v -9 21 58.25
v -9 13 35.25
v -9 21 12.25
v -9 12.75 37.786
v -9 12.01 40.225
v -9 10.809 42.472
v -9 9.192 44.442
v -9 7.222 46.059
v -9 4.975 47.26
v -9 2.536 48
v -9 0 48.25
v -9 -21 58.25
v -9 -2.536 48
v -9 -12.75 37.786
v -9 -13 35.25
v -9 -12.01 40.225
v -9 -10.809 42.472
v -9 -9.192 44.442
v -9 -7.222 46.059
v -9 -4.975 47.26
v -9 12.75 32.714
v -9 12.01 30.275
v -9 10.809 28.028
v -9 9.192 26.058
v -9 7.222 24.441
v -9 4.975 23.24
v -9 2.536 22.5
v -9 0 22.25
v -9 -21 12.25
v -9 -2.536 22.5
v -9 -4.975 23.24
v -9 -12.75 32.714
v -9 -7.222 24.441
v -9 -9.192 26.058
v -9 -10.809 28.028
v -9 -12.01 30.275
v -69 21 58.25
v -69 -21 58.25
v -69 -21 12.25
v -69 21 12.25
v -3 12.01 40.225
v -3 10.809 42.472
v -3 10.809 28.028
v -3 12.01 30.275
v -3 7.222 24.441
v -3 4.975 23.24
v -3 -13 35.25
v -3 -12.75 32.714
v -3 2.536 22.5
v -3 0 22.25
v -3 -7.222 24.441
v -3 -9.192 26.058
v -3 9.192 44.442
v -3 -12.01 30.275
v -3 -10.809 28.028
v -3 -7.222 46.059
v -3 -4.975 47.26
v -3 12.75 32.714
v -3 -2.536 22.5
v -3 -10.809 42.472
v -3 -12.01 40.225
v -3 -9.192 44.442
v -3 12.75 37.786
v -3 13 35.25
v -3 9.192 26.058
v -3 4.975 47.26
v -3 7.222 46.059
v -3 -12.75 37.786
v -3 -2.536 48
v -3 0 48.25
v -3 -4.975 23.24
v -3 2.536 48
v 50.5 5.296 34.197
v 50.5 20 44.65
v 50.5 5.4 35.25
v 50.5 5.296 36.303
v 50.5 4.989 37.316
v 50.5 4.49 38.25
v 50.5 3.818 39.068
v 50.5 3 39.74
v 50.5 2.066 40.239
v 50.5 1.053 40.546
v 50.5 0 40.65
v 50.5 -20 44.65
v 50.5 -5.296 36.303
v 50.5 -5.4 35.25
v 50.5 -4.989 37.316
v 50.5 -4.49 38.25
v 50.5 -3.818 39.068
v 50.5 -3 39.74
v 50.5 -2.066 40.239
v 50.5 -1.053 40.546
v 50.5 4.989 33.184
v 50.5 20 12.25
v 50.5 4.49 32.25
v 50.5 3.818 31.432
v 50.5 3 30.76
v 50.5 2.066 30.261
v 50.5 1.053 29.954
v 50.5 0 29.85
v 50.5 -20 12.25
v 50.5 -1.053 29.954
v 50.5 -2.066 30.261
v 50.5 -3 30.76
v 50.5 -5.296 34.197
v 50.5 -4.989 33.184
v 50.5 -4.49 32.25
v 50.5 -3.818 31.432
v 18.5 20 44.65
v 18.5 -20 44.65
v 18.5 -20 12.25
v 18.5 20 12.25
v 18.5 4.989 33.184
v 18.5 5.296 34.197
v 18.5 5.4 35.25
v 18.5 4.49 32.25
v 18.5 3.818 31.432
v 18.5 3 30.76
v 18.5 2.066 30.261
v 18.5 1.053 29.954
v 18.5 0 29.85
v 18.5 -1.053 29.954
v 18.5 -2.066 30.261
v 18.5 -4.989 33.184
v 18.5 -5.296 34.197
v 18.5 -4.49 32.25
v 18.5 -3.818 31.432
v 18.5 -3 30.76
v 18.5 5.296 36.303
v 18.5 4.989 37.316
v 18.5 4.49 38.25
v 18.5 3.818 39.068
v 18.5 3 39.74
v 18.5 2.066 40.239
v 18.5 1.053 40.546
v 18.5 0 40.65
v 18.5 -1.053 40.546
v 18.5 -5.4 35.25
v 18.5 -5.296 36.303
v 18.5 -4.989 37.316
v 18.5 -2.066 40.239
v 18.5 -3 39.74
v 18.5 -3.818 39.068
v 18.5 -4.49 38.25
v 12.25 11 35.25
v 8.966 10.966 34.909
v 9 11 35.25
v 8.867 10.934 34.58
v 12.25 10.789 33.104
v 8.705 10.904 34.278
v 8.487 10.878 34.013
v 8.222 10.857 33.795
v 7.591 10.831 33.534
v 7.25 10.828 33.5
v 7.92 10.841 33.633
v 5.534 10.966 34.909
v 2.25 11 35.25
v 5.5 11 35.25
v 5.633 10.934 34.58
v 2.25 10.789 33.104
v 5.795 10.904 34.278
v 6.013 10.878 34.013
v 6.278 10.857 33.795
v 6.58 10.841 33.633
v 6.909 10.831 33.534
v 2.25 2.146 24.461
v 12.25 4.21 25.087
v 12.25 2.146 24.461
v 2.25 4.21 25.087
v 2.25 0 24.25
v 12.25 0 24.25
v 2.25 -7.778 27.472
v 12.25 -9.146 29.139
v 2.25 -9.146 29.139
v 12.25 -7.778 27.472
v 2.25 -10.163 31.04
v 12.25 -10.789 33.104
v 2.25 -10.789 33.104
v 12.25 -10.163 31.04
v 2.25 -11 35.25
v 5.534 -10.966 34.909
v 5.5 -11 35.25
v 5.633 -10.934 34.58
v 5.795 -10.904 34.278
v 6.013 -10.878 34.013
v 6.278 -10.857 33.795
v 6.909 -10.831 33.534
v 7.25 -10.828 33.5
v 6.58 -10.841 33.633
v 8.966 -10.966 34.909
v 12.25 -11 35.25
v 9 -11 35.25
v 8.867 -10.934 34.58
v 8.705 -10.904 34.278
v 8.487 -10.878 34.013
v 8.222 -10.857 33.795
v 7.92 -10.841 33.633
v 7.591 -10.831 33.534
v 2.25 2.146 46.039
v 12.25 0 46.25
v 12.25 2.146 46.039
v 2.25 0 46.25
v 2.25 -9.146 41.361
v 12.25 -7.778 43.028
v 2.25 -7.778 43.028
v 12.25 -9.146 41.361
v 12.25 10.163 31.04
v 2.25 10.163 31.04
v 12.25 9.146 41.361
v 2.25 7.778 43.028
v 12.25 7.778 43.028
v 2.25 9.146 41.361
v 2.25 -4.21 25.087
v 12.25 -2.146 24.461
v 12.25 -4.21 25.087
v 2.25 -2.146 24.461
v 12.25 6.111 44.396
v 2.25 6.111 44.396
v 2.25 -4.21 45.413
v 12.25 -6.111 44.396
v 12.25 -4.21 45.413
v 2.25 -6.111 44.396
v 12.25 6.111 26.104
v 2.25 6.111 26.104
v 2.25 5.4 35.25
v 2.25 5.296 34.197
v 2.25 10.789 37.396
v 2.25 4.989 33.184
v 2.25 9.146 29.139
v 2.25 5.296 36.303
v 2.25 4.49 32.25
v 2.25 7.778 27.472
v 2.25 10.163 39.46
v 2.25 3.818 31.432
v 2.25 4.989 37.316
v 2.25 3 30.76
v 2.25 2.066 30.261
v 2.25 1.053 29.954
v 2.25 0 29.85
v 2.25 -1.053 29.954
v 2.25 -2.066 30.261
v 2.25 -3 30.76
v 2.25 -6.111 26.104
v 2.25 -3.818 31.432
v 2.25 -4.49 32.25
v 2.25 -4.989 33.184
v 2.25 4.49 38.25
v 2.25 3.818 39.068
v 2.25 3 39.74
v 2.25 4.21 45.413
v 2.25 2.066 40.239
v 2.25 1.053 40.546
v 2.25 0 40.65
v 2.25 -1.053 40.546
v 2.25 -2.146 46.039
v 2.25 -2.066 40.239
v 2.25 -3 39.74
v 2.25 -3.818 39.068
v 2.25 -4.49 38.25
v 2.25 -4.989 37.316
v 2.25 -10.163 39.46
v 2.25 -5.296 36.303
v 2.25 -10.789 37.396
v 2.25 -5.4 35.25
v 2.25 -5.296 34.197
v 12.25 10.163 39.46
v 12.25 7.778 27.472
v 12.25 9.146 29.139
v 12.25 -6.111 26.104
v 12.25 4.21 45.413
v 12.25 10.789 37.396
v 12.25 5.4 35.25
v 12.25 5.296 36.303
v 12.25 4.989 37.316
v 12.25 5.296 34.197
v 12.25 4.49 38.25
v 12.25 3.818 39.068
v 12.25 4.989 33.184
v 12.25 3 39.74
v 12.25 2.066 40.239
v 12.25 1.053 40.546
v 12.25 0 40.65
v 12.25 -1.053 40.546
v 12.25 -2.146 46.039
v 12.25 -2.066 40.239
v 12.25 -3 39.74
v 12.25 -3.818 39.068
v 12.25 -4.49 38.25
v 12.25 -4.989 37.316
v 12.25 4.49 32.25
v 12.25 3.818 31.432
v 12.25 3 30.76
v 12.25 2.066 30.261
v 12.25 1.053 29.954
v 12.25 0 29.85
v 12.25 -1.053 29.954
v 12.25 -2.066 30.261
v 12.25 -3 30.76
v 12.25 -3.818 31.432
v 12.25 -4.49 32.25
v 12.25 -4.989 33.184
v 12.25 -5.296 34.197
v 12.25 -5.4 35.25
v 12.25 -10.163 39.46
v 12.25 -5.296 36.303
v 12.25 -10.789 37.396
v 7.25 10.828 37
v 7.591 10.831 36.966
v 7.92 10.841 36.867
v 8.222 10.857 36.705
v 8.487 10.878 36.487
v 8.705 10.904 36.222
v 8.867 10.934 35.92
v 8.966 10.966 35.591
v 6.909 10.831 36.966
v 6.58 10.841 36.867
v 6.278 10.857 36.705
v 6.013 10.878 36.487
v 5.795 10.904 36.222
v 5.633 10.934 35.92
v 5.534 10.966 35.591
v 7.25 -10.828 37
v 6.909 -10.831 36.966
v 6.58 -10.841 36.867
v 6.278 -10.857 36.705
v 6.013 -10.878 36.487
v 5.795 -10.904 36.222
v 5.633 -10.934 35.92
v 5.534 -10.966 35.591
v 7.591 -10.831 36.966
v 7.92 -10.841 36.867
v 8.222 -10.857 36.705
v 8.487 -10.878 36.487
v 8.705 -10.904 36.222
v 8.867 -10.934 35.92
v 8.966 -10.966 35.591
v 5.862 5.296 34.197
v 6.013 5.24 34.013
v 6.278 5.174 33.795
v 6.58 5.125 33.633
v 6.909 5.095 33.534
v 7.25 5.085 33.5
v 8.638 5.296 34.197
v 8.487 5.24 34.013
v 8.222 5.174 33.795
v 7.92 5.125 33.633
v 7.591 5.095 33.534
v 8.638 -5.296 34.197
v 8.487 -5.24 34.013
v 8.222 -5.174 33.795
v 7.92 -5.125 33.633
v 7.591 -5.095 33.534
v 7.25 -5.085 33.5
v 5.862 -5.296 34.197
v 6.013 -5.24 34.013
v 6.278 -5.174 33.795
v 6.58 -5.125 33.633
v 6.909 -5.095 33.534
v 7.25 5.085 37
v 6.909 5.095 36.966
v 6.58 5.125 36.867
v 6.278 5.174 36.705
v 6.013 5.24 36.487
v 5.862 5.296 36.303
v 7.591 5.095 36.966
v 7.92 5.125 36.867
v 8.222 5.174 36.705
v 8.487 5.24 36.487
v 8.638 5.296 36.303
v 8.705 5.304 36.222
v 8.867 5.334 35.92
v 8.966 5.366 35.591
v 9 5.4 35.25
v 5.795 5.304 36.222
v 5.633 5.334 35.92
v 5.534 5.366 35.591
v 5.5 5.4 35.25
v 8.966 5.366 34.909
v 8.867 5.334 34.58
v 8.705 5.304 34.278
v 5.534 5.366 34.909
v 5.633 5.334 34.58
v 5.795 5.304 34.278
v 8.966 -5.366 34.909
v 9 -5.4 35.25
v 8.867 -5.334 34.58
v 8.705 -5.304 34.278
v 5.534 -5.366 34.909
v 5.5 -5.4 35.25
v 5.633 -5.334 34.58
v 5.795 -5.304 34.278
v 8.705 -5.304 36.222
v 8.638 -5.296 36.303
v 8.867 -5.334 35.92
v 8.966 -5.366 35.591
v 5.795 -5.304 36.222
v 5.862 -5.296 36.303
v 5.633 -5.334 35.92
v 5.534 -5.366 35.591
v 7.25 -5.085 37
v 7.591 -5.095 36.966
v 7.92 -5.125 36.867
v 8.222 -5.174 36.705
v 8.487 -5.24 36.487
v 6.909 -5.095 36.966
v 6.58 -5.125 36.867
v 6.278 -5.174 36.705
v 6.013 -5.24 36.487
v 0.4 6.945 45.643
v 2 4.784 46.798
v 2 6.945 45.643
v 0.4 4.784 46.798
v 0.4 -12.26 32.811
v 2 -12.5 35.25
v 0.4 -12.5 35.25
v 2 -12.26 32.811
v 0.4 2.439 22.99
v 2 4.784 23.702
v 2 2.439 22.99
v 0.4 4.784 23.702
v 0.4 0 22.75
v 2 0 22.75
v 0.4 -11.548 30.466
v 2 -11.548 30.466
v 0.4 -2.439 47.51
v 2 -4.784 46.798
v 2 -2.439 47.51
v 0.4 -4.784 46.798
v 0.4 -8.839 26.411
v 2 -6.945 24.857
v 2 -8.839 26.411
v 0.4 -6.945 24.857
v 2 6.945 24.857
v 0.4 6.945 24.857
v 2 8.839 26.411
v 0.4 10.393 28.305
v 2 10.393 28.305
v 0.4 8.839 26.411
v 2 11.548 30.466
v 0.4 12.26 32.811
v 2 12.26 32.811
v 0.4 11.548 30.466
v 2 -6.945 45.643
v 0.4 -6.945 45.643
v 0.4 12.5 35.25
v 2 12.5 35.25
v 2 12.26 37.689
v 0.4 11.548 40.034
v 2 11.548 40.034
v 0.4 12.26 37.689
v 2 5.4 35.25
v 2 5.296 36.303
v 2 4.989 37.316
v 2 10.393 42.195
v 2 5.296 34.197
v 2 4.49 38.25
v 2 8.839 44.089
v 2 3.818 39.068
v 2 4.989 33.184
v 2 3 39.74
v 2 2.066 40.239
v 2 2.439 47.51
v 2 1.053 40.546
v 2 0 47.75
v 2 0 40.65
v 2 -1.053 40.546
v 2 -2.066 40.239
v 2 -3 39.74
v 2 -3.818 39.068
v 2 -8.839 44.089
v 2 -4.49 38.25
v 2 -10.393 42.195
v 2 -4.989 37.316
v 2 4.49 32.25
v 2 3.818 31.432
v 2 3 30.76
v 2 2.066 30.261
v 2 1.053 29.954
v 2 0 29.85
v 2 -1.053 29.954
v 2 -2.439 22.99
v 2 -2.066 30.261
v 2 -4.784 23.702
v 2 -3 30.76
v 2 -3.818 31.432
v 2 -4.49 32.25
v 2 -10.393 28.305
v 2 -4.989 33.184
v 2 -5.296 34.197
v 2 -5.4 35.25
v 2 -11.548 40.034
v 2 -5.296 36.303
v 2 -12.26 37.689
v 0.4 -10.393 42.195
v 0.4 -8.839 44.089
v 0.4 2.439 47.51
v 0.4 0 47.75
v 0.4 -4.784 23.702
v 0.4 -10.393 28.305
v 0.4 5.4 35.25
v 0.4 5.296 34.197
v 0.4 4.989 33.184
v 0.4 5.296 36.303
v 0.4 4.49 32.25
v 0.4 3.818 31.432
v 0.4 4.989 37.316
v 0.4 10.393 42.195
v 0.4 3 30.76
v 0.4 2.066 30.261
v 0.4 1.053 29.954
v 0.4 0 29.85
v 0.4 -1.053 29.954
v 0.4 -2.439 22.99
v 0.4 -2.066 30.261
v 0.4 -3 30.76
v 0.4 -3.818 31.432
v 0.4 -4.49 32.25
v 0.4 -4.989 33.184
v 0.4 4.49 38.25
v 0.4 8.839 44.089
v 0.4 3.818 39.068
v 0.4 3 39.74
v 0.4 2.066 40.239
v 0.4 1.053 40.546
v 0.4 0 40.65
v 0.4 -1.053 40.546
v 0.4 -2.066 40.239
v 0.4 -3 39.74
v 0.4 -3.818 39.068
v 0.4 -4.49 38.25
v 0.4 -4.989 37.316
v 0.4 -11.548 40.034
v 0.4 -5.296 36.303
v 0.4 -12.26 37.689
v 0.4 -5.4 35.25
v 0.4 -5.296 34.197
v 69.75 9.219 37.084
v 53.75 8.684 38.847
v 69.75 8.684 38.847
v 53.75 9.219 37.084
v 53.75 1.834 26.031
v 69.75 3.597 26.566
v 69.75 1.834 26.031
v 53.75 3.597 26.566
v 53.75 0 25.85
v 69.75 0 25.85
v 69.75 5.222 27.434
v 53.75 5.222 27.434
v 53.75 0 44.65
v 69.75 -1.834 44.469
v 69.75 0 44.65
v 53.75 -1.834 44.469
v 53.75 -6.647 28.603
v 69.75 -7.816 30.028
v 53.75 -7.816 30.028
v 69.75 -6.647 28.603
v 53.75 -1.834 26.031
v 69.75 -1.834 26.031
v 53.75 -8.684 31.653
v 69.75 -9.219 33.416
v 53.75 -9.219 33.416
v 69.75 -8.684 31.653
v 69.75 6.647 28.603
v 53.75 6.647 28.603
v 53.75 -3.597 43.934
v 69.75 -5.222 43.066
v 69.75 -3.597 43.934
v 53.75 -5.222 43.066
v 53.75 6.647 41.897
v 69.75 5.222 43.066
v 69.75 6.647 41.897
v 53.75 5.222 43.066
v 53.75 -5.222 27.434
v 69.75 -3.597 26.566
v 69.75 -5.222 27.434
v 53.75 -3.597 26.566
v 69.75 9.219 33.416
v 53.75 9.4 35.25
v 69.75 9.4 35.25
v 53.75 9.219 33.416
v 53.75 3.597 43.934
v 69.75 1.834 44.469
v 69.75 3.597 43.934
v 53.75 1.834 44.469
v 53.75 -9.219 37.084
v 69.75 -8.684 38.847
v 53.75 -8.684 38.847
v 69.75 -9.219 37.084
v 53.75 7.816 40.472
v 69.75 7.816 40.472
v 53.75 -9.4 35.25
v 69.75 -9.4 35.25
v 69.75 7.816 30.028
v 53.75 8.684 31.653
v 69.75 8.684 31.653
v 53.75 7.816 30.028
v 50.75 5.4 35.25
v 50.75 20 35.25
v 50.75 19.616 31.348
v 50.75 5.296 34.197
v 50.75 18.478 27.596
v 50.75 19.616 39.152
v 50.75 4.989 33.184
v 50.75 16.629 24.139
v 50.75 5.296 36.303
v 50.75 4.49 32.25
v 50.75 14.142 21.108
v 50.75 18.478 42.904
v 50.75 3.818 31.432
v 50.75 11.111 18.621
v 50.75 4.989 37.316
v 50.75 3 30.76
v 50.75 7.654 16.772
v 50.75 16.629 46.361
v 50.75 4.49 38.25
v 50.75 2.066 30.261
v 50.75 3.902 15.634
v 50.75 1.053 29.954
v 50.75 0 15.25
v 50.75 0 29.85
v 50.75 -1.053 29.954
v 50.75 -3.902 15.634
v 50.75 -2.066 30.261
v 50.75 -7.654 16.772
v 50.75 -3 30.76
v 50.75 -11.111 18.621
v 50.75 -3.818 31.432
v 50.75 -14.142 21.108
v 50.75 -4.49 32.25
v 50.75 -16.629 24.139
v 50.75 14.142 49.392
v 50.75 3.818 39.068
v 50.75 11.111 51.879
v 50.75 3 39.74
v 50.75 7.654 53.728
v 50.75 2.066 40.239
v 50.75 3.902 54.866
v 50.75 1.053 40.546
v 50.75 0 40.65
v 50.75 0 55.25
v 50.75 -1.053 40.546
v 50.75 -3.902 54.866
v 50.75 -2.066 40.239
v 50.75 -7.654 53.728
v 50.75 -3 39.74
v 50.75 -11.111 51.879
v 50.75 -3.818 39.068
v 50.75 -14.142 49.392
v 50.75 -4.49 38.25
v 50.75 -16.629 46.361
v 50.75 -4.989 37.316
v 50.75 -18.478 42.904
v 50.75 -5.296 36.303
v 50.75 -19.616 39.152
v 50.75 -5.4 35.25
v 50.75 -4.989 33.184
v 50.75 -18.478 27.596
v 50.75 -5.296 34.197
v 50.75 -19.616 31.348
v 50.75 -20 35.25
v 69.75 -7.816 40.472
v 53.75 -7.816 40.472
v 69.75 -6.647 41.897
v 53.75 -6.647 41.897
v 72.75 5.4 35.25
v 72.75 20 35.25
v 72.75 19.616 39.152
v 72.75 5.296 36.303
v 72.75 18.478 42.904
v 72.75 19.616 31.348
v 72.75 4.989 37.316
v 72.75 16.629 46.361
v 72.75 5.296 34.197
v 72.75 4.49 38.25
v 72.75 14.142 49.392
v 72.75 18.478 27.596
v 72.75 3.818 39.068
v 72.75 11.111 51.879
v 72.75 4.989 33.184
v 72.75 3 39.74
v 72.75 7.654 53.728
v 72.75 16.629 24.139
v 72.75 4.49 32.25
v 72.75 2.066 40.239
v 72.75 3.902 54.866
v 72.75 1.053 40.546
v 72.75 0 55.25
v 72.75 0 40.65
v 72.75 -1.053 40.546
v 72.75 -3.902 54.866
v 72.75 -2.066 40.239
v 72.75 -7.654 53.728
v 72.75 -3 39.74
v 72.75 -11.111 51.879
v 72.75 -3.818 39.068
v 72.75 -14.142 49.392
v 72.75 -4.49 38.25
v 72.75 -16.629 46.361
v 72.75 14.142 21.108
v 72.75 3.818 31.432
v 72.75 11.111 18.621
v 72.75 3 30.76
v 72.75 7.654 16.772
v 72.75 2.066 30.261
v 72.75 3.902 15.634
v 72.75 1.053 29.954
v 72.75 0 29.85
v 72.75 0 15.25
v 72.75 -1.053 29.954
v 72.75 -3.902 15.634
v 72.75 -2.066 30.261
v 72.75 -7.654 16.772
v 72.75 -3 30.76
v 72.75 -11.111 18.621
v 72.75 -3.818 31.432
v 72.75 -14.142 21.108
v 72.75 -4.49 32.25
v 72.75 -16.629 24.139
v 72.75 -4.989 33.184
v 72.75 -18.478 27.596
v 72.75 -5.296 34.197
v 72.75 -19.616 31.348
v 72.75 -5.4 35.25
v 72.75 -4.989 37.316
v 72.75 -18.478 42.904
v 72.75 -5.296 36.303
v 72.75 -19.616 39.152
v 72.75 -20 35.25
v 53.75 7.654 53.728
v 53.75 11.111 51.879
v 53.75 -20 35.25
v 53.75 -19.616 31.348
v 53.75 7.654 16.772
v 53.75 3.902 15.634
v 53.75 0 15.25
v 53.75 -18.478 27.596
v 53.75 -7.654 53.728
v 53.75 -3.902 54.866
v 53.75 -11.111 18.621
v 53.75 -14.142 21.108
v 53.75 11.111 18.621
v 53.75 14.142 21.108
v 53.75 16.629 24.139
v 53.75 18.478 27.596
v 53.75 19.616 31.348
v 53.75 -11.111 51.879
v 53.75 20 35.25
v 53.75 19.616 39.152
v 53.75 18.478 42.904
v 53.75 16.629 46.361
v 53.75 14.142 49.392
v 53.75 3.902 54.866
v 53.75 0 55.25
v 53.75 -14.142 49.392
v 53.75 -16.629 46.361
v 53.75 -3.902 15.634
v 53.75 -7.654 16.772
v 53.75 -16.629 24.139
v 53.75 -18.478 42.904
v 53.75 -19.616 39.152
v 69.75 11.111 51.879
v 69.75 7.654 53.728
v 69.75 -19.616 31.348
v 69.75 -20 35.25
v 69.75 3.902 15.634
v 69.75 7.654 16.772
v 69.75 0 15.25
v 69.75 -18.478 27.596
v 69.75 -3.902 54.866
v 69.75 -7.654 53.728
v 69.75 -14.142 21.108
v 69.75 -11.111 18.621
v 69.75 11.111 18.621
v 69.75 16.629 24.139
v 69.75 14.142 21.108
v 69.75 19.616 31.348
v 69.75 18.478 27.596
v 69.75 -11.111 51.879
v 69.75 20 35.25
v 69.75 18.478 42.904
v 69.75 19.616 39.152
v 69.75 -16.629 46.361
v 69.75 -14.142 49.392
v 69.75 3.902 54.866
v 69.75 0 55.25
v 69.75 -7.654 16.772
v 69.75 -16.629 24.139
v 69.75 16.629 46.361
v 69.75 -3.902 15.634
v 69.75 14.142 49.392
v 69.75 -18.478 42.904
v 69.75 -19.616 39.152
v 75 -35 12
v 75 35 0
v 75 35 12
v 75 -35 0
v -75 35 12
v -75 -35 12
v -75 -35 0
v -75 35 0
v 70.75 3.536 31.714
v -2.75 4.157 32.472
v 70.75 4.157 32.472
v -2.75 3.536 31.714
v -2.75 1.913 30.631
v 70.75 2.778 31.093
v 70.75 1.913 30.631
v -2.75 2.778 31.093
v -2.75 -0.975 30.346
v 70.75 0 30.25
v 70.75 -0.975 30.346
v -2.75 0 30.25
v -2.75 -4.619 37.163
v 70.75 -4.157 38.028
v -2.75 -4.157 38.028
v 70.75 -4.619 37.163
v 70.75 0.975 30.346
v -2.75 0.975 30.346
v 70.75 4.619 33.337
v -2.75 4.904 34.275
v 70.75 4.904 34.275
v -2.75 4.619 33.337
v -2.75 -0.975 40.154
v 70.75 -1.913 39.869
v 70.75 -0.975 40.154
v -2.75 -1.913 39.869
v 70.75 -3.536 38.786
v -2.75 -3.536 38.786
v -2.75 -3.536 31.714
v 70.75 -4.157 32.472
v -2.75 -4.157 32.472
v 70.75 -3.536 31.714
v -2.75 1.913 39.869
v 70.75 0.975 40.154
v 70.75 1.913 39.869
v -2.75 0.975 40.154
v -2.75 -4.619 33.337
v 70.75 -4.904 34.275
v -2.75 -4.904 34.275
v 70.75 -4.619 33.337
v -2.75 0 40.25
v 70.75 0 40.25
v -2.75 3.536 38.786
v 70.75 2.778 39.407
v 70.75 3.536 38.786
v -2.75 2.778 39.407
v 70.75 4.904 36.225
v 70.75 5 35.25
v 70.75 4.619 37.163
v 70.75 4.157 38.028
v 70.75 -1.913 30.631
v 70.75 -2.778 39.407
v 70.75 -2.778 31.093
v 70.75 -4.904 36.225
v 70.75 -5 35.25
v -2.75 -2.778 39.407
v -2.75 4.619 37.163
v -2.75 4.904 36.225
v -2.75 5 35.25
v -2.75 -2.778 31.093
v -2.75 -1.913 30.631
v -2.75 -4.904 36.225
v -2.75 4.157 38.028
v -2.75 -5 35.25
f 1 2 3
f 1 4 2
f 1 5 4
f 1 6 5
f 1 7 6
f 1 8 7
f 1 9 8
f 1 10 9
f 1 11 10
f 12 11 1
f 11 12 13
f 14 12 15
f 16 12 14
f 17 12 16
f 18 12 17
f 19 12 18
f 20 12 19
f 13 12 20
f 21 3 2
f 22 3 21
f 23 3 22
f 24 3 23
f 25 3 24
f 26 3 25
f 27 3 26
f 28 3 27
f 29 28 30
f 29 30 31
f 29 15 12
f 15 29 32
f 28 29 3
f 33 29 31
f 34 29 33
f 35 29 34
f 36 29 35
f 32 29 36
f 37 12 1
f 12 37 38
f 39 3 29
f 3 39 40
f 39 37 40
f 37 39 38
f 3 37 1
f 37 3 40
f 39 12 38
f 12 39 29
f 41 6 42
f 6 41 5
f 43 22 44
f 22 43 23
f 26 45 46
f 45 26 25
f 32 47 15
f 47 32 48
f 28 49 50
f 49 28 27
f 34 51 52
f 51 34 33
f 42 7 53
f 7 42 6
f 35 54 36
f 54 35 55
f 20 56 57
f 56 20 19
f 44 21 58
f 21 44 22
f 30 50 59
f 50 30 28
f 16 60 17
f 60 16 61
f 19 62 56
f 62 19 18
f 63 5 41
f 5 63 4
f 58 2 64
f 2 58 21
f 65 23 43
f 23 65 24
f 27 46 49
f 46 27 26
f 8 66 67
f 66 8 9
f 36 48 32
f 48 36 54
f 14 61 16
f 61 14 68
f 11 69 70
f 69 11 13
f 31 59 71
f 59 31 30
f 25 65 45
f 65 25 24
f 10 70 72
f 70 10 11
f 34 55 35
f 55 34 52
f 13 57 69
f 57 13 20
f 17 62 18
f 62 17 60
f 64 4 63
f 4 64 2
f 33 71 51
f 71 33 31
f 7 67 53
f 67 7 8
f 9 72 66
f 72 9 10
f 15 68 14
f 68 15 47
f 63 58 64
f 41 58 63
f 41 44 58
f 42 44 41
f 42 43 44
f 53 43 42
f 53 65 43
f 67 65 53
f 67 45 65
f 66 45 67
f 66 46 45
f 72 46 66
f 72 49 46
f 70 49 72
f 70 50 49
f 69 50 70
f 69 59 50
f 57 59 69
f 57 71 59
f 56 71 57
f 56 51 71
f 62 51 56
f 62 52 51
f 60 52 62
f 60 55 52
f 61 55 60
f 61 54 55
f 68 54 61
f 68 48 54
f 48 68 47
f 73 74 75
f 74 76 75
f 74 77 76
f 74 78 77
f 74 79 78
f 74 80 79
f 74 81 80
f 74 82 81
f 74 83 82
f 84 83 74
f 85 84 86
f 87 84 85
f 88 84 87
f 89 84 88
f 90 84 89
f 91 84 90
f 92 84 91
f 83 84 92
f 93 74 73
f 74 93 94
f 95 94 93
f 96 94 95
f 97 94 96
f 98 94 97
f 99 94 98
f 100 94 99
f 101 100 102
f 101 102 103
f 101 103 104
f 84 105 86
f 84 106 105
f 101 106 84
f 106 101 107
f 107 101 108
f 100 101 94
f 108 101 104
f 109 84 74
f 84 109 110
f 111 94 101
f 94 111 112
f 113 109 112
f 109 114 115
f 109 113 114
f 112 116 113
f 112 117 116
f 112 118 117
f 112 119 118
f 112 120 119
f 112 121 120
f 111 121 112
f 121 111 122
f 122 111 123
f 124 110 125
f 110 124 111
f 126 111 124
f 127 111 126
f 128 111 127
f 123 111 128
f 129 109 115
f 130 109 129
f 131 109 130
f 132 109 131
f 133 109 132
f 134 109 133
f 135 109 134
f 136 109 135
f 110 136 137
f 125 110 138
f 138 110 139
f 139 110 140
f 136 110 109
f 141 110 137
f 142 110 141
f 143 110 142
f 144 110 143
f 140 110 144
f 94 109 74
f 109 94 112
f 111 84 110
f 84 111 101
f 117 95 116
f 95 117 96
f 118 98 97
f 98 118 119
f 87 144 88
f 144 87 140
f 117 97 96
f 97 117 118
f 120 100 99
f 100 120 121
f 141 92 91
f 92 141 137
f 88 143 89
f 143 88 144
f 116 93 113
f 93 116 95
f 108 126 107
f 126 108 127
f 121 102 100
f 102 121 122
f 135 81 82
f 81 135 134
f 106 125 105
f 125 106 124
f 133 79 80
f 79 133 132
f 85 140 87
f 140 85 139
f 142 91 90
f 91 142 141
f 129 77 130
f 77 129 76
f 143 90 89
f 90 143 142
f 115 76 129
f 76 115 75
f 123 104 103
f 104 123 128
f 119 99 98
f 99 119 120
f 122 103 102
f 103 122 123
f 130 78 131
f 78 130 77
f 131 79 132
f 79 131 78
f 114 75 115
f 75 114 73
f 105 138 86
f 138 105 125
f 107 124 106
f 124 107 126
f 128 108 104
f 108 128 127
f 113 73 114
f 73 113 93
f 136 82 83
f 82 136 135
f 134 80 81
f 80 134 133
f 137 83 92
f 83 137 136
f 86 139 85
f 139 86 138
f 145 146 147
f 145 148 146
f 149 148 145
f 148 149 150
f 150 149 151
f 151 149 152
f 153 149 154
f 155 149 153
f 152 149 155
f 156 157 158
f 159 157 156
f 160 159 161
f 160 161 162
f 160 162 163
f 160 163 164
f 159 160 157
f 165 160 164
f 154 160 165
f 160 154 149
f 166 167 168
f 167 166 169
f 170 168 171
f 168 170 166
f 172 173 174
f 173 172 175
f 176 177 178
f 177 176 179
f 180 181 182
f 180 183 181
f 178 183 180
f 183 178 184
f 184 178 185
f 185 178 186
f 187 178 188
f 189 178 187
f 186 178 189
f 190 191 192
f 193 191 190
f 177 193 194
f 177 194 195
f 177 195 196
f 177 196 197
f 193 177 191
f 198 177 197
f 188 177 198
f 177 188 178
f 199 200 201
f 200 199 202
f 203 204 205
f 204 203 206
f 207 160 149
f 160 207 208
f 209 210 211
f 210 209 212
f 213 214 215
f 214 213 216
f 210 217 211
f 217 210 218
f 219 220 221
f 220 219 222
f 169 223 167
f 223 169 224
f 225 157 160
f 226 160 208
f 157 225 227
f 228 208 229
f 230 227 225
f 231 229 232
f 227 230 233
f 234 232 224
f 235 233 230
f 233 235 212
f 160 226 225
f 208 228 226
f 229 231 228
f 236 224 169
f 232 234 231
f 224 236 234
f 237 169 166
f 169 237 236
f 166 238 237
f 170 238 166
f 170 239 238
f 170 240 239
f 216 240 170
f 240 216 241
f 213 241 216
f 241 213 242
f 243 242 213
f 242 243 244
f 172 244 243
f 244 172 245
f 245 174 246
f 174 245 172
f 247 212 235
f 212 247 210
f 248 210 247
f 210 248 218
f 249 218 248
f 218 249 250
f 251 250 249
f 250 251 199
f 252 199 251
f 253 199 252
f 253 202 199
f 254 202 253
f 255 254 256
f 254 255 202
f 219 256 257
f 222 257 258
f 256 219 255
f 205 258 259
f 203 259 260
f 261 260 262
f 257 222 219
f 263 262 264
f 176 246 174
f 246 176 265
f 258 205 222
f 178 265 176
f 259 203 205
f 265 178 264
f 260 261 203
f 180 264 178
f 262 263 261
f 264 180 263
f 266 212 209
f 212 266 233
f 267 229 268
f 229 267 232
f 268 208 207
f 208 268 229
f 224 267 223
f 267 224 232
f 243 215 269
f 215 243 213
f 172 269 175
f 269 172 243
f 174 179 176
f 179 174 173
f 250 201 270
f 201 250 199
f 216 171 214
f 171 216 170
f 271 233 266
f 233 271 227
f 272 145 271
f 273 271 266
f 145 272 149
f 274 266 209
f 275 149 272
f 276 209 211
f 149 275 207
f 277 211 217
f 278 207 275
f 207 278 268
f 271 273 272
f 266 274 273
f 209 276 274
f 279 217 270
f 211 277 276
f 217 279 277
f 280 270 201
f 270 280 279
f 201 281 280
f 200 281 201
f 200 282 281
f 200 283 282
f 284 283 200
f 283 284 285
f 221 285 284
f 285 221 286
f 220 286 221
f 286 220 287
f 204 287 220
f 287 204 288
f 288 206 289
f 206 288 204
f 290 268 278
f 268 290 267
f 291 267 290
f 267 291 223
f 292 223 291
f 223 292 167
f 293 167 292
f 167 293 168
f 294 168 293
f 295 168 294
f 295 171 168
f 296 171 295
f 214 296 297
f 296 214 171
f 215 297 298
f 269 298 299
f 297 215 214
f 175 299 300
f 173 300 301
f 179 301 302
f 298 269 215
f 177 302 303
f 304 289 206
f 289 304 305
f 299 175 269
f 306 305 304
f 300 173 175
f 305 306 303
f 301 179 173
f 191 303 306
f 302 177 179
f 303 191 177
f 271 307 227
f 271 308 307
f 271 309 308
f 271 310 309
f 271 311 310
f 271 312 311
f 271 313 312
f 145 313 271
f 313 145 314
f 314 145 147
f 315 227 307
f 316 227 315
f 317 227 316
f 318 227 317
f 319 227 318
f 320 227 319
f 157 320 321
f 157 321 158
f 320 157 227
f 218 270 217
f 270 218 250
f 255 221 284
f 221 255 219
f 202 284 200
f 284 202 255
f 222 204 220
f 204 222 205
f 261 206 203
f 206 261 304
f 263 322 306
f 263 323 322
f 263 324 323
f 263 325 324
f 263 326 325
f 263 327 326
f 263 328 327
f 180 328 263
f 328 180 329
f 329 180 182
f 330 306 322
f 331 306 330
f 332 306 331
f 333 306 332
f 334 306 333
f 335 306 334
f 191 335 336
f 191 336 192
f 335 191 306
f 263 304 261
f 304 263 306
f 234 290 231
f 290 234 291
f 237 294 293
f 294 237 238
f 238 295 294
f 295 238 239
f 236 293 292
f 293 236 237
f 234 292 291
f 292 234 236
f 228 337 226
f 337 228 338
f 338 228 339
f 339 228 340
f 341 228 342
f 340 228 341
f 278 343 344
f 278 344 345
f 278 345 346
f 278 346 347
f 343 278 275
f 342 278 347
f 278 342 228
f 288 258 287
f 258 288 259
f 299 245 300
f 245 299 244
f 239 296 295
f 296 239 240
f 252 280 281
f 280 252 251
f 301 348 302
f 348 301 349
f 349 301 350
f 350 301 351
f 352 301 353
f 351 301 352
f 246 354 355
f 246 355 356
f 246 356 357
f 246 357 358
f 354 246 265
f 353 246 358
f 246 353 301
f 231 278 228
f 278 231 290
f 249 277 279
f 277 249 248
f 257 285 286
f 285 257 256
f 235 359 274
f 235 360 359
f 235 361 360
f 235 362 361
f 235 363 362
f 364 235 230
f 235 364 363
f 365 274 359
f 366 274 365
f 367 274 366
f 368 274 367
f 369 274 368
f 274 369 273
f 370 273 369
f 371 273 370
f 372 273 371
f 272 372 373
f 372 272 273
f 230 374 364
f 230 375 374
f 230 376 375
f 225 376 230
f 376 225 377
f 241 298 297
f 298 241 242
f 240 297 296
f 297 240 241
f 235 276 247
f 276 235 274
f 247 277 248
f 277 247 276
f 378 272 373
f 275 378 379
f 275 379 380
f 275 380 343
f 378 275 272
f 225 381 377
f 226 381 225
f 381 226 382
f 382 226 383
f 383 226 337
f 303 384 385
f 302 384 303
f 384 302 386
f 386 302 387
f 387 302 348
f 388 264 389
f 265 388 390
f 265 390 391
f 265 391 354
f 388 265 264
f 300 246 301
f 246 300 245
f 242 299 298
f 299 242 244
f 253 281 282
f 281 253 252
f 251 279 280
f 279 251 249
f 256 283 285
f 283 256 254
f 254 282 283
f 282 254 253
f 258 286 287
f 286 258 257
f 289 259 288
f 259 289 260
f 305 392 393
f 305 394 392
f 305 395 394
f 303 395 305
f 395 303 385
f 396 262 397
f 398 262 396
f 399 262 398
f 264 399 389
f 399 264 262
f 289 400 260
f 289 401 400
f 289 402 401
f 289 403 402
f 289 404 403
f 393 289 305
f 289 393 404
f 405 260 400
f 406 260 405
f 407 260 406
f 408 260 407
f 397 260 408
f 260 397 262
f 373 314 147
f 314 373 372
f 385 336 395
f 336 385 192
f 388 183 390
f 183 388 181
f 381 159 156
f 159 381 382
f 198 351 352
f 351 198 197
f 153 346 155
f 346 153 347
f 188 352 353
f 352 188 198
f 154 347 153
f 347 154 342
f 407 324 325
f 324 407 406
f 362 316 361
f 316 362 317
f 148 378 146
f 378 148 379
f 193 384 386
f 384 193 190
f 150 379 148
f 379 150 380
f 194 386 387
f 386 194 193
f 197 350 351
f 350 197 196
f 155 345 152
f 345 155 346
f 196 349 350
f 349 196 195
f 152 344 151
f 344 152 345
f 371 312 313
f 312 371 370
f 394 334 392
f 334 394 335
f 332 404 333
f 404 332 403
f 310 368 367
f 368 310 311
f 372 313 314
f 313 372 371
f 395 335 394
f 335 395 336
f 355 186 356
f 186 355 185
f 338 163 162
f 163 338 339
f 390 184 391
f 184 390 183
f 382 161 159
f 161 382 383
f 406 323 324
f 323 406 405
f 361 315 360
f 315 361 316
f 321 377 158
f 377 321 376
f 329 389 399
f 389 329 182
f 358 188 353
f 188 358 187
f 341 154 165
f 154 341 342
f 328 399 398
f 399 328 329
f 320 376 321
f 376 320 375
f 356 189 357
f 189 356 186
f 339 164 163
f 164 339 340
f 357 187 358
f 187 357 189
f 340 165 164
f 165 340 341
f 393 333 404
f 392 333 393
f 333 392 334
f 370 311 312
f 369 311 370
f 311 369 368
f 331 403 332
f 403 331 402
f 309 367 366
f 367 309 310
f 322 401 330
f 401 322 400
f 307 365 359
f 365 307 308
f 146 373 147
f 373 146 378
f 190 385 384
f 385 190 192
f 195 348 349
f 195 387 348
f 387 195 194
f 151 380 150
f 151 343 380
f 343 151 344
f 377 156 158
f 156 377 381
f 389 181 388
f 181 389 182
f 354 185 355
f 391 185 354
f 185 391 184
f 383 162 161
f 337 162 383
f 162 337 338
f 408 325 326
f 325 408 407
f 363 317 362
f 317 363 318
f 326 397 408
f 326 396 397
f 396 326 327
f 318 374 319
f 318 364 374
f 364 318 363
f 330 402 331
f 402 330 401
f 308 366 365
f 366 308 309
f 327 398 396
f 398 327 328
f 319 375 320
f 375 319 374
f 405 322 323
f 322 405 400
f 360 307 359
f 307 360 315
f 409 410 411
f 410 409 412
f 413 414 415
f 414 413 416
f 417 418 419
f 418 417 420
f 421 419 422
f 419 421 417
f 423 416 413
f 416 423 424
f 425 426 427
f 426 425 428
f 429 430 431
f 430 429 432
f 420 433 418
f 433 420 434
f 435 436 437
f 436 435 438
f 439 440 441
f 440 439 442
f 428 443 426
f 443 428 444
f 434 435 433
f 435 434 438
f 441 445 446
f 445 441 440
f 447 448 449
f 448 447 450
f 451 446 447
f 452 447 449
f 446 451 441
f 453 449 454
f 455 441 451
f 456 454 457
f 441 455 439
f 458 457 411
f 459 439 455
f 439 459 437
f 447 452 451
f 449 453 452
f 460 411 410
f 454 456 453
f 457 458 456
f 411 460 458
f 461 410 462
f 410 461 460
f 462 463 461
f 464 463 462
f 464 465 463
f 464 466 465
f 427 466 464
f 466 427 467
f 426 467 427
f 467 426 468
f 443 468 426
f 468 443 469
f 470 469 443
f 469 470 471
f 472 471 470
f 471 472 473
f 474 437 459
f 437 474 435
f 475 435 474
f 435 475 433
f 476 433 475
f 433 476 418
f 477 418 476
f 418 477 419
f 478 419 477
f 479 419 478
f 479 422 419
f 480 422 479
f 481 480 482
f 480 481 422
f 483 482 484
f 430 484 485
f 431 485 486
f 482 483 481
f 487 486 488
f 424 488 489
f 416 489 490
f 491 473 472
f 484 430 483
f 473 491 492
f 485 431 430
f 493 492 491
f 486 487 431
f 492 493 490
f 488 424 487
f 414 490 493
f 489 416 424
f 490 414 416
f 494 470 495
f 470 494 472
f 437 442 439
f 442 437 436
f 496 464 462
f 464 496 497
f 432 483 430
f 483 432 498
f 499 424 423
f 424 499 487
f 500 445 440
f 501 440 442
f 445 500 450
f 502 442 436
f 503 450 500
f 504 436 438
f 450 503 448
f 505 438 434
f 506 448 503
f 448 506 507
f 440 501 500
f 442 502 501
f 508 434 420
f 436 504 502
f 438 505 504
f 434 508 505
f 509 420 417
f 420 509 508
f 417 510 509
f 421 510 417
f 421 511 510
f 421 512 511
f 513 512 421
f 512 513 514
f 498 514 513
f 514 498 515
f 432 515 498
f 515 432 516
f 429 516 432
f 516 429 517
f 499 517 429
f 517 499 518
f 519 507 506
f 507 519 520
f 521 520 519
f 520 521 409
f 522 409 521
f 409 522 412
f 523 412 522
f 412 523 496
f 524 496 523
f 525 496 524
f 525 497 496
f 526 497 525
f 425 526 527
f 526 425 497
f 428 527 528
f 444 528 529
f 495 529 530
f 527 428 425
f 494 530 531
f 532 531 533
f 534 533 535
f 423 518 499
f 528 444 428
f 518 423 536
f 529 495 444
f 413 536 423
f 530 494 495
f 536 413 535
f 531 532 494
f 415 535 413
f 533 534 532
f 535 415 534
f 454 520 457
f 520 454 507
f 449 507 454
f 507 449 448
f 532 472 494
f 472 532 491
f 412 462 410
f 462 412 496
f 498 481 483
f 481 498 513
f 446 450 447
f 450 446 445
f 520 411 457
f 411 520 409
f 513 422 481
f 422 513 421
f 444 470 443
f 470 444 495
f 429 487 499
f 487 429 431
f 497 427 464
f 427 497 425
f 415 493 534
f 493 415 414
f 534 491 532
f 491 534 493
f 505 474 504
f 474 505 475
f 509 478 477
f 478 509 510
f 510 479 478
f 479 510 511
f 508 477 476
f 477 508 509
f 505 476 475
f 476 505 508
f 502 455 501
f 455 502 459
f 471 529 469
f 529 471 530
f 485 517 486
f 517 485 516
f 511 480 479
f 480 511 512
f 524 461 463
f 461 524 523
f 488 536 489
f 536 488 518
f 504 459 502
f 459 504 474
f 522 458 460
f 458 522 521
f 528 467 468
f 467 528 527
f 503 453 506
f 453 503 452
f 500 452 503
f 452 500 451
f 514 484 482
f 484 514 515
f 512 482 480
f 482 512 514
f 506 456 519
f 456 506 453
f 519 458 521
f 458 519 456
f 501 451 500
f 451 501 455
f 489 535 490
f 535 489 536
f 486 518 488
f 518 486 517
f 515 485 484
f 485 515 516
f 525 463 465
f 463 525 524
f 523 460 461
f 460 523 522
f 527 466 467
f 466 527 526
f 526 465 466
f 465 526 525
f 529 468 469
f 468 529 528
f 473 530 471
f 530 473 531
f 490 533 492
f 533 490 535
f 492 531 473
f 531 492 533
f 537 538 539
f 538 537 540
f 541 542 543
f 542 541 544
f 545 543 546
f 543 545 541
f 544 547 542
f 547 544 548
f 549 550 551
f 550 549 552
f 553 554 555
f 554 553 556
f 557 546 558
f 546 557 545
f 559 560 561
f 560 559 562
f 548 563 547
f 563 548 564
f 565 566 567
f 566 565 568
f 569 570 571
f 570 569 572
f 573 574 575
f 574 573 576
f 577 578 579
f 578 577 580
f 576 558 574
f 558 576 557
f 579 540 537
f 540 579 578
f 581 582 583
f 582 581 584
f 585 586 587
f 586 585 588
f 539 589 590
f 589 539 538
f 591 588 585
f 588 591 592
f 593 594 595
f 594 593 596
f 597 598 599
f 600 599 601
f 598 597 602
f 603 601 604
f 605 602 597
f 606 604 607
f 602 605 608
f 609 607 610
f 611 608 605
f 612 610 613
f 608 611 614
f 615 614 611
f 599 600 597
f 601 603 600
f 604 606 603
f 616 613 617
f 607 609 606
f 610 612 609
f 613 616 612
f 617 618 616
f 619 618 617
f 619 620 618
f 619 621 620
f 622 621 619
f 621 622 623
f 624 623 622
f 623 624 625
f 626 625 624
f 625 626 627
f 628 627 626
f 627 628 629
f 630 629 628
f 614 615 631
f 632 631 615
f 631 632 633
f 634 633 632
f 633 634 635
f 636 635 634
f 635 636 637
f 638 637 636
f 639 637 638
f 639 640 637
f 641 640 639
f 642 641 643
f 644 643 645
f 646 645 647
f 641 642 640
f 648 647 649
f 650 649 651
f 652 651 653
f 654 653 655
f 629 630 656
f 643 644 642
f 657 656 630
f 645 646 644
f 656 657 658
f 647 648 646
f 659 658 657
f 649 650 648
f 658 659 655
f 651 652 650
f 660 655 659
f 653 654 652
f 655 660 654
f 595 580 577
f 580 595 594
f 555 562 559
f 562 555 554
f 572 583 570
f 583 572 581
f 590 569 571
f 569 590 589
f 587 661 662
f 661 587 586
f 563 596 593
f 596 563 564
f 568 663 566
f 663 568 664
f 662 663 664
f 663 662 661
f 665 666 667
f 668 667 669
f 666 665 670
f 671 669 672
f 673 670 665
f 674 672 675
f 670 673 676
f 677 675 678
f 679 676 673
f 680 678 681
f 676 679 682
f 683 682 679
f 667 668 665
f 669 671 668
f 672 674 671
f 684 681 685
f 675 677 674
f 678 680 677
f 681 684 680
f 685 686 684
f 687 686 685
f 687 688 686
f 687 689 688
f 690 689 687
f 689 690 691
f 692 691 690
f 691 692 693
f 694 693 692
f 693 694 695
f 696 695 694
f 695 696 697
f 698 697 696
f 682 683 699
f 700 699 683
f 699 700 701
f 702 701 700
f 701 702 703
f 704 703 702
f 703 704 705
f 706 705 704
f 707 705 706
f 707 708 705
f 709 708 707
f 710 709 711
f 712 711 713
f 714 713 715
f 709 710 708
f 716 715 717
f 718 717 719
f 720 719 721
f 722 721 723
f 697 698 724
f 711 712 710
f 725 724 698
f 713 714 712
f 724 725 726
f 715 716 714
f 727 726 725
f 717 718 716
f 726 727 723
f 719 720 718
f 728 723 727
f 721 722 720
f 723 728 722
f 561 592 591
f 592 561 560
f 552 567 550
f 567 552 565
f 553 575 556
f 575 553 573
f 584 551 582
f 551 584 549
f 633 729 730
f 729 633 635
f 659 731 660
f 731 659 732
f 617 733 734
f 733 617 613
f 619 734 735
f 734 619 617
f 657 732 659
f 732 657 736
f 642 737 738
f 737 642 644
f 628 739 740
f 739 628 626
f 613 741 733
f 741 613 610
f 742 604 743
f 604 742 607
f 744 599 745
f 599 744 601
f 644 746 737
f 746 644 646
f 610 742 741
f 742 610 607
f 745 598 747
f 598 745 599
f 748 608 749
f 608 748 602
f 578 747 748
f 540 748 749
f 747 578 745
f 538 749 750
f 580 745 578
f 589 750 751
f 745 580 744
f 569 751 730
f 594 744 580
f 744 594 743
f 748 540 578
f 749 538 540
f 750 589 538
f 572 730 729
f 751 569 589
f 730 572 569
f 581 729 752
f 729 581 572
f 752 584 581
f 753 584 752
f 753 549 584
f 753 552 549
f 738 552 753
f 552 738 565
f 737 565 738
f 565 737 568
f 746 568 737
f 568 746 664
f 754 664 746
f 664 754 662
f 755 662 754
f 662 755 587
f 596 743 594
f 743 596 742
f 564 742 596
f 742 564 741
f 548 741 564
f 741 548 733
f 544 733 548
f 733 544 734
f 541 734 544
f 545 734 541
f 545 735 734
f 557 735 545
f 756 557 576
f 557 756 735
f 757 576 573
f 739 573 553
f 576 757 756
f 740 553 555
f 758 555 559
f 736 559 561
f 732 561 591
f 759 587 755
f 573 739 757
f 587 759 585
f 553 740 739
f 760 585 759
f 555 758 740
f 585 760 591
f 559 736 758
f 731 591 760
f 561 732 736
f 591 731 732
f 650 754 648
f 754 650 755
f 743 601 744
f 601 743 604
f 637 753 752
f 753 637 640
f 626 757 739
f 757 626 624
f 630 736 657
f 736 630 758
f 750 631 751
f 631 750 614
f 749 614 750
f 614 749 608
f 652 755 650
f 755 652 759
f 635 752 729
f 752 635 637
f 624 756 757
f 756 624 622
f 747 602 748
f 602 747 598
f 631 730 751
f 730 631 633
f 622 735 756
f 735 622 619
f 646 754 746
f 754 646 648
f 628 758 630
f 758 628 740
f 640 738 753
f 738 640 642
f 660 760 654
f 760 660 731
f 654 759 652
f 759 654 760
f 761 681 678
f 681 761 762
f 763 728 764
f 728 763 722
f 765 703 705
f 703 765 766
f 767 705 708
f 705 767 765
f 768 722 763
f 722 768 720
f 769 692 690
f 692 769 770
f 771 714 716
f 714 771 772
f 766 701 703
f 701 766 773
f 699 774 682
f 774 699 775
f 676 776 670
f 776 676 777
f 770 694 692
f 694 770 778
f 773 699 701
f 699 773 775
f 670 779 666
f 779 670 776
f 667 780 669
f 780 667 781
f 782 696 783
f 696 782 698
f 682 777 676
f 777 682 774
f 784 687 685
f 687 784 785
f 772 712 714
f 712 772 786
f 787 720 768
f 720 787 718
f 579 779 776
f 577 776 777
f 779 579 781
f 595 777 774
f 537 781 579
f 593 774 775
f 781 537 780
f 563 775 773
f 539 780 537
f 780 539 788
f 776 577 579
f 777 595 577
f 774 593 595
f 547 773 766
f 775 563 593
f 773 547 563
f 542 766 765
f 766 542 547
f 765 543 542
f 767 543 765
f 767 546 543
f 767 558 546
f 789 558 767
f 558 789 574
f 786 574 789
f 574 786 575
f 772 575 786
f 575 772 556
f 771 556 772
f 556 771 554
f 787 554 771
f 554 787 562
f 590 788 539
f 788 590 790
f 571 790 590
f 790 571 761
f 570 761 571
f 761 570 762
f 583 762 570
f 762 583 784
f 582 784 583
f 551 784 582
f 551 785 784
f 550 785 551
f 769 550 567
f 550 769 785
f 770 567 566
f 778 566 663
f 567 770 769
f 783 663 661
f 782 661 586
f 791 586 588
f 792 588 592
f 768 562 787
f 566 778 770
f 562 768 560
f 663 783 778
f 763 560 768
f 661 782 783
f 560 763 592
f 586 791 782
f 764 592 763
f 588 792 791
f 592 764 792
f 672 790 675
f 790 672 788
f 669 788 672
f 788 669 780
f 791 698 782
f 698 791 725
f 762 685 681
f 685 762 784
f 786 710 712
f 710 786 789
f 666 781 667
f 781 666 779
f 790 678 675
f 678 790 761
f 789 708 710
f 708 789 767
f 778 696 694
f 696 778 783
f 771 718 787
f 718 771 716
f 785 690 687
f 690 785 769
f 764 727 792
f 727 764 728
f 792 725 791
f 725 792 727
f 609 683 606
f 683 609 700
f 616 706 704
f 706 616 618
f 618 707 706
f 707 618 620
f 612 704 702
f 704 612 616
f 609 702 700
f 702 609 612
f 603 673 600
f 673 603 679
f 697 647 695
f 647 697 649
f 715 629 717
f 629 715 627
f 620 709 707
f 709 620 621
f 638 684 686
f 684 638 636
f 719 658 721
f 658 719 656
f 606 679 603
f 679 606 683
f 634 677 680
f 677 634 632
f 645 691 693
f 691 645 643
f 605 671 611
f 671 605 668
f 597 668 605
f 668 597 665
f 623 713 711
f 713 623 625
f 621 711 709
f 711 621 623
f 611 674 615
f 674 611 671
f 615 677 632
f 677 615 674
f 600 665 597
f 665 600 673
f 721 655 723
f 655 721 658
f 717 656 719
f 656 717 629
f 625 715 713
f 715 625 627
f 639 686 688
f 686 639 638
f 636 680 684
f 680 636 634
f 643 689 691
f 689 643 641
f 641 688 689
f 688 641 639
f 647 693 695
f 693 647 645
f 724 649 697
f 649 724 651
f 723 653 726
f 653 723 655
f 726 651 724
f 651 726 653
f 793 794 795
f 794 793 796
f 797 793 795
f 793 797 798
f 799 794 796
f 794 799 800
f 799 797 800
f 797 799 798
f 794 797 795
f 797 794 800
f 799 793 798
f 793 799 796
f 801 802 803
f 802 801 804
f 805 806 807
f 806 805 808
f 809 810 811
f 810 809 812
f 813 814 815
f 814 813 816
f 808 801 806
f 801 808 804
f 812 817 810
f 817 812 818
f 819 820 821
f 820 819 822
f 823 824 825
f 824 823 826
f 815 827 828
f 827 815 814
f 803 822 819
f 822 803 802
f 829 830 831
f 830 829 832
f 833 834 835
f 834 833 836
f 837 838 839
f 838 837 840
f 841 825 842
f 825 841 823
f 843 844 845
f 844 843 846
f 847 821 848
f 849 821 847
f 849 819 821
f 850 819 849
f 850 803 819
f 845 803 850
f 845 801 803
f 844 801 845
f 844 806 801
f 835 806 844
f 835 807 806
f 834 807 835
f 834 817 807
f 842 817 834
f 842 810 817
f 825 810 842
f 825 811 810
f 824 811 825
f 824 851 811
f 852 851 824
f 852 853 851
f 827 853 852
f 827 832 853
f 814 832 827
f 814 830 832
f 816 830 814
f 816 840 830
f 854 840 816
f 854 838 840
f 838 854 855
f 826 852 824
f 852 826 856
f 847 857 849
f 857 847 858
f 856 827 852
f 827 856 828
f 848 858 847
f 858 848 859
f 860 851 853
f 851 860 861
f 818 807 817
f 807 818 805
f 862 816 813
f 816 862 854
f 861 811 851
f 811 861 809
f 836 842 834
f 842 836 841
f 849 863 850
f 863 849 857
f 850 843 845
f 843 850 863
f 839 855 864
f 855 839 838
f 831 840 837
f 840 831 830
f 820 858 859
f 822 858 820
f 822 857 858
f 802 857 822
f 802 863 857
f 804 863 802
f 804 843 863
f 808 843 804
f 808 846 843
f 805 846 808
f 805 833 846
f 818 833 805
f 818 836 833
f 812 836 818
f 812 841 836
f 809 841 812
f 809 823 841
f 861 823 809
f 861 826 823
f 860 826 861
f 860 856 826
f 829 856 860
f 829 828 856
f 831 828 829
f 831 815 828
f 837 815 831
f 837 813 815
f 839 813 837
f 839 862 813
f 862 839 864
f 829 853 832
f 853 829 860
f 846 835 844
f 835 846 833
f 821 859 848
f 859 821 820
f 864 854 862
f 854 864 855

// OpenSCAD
$fn = 32;

// ------------------------------------------------------------------------
// Motor drive station: motor 60 x 46 mm, shaft d10, pulley d40
// Every part is its own module, assembly() places every instance.
// ------------------------------------------------------------------------

// --- part 1 ---
module station_bed() {
  difference() {
    translate([-75, -35, 0]) cube([150, 70, 12]);
  }
}

// --- part 2 ---
module drive_motor() {
  union() {
    translate([-30, -21, 0]) cube([60, 42, 46]);
    translate([33, 0, 23]) rotate([0, 90, 0]) cylinder(h = 6, d = 26, center = true);
  }
}

// --- part 3 ---
module pillow_block() {
  difference() {
    translate([-16, -20, 0]) cube([32, 40, 32.4]);
    translate([0, 0, 23]) rotate([0, 90, 0]) cylinder(h = 34, d = 10.8, center = true);
  }
}

// --- part 4 ---
module drive_shaft() {
  translate([0, 0, -36.75]) cylinder(h = 73.5, d = 10);
}

// --- part 5 ---
module shaft_collar() {
  difference() {
    cylinder(h = 10, d = 22);
    translate([0, 0, -1]) cylinder(h = 12, d = 10.8);
    translate([0, 0, 5]) rotate([90, 0, 0]) cylinder(h = 24, d = 3.5, center = true);
  }
}

// --- part 6 ---
module collar_washer() {
  difference() {
      translate([0, 0, 0]) cylinder(h = 1.6, d = 25);
      translate([0, 0, -1]) cylinder(h = 3.6, d = 10.8);
    }
}

// --- part 7 ---
module drive_pulley() {
  difference() {
    union() {
      cylinder(h = 22, d = 18.8);
      cylinder(h = 3, d = 40);
      translate([0, 0, 19]) cylinder(h = 3, d = 40);
    }
    translate([0, 0, -1]) cylinder(h = 24, d = 10.8);
  }
}

// --- assembly ---
module assembly() {
  color([0.80, 0.24, 0.20]) translate([0, 0, 0]) rotate([0, 0, 0]) station_bed();
  color([0.20, 0.45, 0.75]) translate([-39, 0, 12.25]) rotate([0, 0, 0]) drive_motor();
  color([0.25, 0.62, 0.32]) translate([34.5, 0, 12.25]) rotate([0, 0, 0]) pillow_block();
  color([0.92, 0.70, 0.18]) translate([34, 0, 35.25]) rotate([0, 90, 0]) drive_shaft();
  color([0.58, 0.35, 0.70]) translate([2.25, 0, 35.25]) rotate([0, 90, 0]) shaft_collar();
  color([0.16, 0.66, 0.66]) translate([0.4, 0, 35.25]) rotate([0, 90, 0]) collar_washer();
  color([0.85, 0.48, 0.18]) translate([50.75, 0, 35.25]) rotate([0, 90, 0]) drive_pulley();
}

assembly();
